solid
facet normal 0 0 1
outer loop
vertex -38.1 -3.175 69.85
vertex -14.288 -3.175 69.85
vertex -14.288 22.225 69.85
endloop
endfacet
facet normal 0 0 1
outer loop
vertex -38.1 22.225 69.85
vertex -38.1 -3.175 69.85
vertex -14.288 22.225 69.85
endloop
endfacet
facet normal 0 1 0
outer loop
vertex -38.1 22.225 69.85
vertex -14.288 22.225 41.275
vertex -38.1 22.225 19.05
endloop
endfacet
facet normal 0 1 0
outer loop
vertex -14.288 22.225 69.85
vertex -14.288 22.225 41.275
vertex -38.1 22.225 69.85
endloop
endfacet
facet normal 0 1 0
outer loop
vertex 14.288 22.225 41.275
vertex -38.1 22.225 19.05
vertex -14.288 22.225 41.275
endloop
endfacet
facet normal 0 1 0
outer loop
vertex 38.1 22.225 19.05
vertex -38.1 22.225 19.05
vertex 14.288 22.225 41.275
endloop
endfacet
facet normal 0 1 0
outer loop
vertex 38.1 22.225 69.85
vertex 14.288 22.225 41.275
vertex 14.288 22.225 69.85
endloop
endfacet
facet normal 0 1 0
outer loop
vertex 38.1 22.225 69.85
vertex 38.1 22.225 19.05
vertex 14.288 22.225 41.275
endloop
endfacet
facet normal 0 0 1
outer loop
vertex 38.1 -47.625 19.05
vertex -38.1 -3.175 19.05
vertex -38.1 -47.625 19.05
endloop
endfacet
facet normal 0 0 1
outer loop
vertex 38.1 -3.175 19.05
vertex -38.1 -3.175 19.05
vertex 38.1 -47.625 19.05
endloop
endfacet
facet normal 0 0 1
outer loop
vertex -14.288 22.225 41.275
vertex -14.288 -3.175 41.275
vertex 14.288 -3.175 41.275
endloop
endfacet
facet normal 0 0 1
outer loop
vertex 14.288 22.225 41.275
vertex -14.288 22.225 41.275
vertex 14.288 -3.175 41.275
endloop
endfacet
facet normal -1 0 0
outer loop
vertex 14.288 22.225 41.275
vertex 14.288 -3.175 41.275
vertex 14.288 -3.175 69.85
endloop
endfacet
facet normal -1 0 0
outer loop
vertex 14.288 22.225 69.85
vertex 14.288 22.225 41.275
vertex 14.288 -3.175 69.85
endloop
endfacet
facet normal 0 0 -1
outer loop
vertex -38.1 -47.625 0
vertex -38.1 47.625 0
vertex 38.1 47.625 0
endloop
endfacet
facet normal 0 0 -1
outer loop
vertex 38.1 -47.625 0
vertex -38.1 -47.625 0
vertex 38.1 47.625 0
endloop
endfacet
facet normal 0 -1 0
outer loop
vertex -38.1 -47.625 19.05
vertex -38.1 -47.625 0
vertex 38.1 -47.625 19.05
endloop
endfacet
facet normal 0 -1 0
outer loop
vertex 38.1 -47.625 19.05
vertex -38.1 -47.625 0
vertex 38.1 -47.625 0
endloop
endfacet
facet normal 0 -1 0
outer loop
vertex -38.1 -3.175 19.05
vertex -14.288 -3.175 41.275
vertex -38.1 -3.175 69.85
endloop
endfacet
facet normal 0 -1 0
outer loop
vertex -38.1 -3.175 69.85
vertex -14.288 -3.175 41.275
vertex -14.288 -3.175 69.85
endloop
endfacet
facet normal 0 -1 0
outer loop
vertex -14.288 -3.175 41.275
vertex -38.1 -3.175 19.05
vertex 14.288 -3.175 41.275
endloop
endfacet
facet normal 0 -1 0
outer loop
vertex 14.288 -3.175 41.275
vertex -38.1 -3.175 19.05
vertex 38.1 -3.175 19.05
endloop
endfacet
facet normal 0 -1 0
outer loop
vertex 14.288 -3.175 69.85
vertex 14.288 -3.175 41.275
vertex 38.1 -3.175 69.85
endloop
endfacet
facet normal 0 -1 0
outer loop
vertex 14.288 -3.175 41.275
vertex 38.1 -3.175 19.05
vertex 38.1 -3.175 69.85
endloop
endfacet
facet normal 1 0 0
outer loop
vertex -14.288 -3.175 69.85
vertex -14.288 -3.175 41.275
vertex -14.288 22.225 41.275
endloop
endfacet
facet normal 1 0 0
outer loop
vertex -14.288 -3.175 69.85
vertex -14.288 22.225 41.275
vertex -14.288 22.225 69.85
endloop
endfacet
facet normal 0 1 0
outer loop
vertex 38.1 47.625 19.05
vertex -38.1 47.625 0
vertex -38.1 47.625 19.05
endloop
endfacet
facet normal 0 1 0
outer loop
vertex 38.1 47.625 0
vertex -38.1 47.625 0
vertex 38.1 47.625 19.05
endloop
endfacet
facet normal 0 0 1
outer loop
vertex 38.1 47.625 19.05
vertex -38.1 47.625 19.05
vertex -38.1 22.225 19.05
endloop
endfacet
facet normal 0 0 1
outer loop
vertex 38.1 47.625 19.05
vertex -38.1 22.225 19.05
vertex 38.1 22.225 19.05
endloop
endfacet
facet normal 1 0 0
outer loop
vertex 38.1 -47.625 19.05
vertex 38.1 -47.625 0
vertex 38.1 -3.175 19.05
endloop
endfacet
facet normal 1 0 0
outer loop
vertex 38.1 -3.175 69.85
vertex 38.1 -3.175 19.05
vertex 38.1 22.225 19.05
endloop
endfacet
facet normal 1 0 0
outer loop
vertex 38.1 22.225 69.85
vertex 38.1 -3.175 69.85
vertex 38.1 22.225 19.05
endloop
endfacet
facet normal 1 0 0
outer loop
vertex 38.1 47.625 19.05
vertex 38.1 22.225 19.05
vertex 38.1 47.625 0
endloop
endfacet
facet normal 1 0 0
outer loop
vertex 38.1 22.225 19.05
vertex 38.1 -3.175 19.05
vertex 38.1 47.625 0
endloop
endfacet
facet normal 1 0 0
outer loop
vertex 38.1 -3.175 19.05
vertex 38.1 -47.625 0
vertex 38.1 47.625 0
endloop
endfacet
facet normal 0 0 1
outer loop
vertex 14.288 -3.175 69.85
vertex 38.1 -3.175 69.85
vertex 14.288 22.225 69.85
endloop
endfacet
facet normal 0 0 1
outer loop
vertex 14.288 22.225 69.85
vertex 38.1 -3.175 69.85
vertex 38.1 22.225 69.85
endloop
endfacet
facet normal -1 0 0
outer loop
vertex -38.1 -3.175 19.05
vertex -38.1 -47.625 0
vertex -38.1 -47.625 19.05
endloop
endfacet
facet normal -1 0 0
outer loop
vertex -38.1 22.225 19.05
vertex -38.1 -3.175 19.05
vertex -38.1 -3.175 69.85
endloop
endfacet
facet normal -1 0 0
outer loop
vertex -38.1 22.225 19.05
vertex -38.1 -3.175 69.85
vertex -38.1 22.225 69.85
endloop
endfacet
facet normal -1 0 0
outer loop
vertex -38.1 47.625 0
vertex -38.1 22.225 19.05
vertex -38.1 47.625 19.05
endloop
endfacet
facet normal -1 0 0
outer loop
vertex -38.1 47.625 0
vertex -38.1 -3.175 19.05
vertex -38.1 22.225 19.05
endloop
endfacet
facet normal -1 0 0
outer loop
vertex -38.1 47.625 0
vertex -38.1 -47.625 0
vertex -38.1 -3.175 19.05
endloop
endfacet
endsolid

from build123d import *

# Parameters (mm, degrees)
F0_W     = 76.2
F0_H     = 95.25
F1_DEPTH = 19.05
F2_W     = 25.4
F2_H     = 50.8
F3_DEPTH = 76.2
F6_W     = 28.575
F6_H     = 28.575
F7_DEPTH = 127


with BuildPart() as f1:
    # F0 (on Top) → F1 (new body)
    with BuildSketch(Plane.XY):
        Rectangle(F0_W, F0_H)
    extrude(amount=F1_DEPTH)

    # F2 (on face) → F3 (join, through all)
    with BuildSketch(Plane.YZ.offset(38.1)):
        with Locations((9.525, 44.45)):
            Rectangle(F2_W, F2_H)
    extrude(amount=-F3_DEPTH)

    # F6 (on face) → F7 (cut)
    with BuildSketch(Plane.XZ.offset(3.175)):
        with Locations((0, 55.5625)):
            Rectangle(F6_W, F6_H)
    extrude(amount=-F7_DEPTH, mode=Mode.SUBTRACT)


solid = f1.part
